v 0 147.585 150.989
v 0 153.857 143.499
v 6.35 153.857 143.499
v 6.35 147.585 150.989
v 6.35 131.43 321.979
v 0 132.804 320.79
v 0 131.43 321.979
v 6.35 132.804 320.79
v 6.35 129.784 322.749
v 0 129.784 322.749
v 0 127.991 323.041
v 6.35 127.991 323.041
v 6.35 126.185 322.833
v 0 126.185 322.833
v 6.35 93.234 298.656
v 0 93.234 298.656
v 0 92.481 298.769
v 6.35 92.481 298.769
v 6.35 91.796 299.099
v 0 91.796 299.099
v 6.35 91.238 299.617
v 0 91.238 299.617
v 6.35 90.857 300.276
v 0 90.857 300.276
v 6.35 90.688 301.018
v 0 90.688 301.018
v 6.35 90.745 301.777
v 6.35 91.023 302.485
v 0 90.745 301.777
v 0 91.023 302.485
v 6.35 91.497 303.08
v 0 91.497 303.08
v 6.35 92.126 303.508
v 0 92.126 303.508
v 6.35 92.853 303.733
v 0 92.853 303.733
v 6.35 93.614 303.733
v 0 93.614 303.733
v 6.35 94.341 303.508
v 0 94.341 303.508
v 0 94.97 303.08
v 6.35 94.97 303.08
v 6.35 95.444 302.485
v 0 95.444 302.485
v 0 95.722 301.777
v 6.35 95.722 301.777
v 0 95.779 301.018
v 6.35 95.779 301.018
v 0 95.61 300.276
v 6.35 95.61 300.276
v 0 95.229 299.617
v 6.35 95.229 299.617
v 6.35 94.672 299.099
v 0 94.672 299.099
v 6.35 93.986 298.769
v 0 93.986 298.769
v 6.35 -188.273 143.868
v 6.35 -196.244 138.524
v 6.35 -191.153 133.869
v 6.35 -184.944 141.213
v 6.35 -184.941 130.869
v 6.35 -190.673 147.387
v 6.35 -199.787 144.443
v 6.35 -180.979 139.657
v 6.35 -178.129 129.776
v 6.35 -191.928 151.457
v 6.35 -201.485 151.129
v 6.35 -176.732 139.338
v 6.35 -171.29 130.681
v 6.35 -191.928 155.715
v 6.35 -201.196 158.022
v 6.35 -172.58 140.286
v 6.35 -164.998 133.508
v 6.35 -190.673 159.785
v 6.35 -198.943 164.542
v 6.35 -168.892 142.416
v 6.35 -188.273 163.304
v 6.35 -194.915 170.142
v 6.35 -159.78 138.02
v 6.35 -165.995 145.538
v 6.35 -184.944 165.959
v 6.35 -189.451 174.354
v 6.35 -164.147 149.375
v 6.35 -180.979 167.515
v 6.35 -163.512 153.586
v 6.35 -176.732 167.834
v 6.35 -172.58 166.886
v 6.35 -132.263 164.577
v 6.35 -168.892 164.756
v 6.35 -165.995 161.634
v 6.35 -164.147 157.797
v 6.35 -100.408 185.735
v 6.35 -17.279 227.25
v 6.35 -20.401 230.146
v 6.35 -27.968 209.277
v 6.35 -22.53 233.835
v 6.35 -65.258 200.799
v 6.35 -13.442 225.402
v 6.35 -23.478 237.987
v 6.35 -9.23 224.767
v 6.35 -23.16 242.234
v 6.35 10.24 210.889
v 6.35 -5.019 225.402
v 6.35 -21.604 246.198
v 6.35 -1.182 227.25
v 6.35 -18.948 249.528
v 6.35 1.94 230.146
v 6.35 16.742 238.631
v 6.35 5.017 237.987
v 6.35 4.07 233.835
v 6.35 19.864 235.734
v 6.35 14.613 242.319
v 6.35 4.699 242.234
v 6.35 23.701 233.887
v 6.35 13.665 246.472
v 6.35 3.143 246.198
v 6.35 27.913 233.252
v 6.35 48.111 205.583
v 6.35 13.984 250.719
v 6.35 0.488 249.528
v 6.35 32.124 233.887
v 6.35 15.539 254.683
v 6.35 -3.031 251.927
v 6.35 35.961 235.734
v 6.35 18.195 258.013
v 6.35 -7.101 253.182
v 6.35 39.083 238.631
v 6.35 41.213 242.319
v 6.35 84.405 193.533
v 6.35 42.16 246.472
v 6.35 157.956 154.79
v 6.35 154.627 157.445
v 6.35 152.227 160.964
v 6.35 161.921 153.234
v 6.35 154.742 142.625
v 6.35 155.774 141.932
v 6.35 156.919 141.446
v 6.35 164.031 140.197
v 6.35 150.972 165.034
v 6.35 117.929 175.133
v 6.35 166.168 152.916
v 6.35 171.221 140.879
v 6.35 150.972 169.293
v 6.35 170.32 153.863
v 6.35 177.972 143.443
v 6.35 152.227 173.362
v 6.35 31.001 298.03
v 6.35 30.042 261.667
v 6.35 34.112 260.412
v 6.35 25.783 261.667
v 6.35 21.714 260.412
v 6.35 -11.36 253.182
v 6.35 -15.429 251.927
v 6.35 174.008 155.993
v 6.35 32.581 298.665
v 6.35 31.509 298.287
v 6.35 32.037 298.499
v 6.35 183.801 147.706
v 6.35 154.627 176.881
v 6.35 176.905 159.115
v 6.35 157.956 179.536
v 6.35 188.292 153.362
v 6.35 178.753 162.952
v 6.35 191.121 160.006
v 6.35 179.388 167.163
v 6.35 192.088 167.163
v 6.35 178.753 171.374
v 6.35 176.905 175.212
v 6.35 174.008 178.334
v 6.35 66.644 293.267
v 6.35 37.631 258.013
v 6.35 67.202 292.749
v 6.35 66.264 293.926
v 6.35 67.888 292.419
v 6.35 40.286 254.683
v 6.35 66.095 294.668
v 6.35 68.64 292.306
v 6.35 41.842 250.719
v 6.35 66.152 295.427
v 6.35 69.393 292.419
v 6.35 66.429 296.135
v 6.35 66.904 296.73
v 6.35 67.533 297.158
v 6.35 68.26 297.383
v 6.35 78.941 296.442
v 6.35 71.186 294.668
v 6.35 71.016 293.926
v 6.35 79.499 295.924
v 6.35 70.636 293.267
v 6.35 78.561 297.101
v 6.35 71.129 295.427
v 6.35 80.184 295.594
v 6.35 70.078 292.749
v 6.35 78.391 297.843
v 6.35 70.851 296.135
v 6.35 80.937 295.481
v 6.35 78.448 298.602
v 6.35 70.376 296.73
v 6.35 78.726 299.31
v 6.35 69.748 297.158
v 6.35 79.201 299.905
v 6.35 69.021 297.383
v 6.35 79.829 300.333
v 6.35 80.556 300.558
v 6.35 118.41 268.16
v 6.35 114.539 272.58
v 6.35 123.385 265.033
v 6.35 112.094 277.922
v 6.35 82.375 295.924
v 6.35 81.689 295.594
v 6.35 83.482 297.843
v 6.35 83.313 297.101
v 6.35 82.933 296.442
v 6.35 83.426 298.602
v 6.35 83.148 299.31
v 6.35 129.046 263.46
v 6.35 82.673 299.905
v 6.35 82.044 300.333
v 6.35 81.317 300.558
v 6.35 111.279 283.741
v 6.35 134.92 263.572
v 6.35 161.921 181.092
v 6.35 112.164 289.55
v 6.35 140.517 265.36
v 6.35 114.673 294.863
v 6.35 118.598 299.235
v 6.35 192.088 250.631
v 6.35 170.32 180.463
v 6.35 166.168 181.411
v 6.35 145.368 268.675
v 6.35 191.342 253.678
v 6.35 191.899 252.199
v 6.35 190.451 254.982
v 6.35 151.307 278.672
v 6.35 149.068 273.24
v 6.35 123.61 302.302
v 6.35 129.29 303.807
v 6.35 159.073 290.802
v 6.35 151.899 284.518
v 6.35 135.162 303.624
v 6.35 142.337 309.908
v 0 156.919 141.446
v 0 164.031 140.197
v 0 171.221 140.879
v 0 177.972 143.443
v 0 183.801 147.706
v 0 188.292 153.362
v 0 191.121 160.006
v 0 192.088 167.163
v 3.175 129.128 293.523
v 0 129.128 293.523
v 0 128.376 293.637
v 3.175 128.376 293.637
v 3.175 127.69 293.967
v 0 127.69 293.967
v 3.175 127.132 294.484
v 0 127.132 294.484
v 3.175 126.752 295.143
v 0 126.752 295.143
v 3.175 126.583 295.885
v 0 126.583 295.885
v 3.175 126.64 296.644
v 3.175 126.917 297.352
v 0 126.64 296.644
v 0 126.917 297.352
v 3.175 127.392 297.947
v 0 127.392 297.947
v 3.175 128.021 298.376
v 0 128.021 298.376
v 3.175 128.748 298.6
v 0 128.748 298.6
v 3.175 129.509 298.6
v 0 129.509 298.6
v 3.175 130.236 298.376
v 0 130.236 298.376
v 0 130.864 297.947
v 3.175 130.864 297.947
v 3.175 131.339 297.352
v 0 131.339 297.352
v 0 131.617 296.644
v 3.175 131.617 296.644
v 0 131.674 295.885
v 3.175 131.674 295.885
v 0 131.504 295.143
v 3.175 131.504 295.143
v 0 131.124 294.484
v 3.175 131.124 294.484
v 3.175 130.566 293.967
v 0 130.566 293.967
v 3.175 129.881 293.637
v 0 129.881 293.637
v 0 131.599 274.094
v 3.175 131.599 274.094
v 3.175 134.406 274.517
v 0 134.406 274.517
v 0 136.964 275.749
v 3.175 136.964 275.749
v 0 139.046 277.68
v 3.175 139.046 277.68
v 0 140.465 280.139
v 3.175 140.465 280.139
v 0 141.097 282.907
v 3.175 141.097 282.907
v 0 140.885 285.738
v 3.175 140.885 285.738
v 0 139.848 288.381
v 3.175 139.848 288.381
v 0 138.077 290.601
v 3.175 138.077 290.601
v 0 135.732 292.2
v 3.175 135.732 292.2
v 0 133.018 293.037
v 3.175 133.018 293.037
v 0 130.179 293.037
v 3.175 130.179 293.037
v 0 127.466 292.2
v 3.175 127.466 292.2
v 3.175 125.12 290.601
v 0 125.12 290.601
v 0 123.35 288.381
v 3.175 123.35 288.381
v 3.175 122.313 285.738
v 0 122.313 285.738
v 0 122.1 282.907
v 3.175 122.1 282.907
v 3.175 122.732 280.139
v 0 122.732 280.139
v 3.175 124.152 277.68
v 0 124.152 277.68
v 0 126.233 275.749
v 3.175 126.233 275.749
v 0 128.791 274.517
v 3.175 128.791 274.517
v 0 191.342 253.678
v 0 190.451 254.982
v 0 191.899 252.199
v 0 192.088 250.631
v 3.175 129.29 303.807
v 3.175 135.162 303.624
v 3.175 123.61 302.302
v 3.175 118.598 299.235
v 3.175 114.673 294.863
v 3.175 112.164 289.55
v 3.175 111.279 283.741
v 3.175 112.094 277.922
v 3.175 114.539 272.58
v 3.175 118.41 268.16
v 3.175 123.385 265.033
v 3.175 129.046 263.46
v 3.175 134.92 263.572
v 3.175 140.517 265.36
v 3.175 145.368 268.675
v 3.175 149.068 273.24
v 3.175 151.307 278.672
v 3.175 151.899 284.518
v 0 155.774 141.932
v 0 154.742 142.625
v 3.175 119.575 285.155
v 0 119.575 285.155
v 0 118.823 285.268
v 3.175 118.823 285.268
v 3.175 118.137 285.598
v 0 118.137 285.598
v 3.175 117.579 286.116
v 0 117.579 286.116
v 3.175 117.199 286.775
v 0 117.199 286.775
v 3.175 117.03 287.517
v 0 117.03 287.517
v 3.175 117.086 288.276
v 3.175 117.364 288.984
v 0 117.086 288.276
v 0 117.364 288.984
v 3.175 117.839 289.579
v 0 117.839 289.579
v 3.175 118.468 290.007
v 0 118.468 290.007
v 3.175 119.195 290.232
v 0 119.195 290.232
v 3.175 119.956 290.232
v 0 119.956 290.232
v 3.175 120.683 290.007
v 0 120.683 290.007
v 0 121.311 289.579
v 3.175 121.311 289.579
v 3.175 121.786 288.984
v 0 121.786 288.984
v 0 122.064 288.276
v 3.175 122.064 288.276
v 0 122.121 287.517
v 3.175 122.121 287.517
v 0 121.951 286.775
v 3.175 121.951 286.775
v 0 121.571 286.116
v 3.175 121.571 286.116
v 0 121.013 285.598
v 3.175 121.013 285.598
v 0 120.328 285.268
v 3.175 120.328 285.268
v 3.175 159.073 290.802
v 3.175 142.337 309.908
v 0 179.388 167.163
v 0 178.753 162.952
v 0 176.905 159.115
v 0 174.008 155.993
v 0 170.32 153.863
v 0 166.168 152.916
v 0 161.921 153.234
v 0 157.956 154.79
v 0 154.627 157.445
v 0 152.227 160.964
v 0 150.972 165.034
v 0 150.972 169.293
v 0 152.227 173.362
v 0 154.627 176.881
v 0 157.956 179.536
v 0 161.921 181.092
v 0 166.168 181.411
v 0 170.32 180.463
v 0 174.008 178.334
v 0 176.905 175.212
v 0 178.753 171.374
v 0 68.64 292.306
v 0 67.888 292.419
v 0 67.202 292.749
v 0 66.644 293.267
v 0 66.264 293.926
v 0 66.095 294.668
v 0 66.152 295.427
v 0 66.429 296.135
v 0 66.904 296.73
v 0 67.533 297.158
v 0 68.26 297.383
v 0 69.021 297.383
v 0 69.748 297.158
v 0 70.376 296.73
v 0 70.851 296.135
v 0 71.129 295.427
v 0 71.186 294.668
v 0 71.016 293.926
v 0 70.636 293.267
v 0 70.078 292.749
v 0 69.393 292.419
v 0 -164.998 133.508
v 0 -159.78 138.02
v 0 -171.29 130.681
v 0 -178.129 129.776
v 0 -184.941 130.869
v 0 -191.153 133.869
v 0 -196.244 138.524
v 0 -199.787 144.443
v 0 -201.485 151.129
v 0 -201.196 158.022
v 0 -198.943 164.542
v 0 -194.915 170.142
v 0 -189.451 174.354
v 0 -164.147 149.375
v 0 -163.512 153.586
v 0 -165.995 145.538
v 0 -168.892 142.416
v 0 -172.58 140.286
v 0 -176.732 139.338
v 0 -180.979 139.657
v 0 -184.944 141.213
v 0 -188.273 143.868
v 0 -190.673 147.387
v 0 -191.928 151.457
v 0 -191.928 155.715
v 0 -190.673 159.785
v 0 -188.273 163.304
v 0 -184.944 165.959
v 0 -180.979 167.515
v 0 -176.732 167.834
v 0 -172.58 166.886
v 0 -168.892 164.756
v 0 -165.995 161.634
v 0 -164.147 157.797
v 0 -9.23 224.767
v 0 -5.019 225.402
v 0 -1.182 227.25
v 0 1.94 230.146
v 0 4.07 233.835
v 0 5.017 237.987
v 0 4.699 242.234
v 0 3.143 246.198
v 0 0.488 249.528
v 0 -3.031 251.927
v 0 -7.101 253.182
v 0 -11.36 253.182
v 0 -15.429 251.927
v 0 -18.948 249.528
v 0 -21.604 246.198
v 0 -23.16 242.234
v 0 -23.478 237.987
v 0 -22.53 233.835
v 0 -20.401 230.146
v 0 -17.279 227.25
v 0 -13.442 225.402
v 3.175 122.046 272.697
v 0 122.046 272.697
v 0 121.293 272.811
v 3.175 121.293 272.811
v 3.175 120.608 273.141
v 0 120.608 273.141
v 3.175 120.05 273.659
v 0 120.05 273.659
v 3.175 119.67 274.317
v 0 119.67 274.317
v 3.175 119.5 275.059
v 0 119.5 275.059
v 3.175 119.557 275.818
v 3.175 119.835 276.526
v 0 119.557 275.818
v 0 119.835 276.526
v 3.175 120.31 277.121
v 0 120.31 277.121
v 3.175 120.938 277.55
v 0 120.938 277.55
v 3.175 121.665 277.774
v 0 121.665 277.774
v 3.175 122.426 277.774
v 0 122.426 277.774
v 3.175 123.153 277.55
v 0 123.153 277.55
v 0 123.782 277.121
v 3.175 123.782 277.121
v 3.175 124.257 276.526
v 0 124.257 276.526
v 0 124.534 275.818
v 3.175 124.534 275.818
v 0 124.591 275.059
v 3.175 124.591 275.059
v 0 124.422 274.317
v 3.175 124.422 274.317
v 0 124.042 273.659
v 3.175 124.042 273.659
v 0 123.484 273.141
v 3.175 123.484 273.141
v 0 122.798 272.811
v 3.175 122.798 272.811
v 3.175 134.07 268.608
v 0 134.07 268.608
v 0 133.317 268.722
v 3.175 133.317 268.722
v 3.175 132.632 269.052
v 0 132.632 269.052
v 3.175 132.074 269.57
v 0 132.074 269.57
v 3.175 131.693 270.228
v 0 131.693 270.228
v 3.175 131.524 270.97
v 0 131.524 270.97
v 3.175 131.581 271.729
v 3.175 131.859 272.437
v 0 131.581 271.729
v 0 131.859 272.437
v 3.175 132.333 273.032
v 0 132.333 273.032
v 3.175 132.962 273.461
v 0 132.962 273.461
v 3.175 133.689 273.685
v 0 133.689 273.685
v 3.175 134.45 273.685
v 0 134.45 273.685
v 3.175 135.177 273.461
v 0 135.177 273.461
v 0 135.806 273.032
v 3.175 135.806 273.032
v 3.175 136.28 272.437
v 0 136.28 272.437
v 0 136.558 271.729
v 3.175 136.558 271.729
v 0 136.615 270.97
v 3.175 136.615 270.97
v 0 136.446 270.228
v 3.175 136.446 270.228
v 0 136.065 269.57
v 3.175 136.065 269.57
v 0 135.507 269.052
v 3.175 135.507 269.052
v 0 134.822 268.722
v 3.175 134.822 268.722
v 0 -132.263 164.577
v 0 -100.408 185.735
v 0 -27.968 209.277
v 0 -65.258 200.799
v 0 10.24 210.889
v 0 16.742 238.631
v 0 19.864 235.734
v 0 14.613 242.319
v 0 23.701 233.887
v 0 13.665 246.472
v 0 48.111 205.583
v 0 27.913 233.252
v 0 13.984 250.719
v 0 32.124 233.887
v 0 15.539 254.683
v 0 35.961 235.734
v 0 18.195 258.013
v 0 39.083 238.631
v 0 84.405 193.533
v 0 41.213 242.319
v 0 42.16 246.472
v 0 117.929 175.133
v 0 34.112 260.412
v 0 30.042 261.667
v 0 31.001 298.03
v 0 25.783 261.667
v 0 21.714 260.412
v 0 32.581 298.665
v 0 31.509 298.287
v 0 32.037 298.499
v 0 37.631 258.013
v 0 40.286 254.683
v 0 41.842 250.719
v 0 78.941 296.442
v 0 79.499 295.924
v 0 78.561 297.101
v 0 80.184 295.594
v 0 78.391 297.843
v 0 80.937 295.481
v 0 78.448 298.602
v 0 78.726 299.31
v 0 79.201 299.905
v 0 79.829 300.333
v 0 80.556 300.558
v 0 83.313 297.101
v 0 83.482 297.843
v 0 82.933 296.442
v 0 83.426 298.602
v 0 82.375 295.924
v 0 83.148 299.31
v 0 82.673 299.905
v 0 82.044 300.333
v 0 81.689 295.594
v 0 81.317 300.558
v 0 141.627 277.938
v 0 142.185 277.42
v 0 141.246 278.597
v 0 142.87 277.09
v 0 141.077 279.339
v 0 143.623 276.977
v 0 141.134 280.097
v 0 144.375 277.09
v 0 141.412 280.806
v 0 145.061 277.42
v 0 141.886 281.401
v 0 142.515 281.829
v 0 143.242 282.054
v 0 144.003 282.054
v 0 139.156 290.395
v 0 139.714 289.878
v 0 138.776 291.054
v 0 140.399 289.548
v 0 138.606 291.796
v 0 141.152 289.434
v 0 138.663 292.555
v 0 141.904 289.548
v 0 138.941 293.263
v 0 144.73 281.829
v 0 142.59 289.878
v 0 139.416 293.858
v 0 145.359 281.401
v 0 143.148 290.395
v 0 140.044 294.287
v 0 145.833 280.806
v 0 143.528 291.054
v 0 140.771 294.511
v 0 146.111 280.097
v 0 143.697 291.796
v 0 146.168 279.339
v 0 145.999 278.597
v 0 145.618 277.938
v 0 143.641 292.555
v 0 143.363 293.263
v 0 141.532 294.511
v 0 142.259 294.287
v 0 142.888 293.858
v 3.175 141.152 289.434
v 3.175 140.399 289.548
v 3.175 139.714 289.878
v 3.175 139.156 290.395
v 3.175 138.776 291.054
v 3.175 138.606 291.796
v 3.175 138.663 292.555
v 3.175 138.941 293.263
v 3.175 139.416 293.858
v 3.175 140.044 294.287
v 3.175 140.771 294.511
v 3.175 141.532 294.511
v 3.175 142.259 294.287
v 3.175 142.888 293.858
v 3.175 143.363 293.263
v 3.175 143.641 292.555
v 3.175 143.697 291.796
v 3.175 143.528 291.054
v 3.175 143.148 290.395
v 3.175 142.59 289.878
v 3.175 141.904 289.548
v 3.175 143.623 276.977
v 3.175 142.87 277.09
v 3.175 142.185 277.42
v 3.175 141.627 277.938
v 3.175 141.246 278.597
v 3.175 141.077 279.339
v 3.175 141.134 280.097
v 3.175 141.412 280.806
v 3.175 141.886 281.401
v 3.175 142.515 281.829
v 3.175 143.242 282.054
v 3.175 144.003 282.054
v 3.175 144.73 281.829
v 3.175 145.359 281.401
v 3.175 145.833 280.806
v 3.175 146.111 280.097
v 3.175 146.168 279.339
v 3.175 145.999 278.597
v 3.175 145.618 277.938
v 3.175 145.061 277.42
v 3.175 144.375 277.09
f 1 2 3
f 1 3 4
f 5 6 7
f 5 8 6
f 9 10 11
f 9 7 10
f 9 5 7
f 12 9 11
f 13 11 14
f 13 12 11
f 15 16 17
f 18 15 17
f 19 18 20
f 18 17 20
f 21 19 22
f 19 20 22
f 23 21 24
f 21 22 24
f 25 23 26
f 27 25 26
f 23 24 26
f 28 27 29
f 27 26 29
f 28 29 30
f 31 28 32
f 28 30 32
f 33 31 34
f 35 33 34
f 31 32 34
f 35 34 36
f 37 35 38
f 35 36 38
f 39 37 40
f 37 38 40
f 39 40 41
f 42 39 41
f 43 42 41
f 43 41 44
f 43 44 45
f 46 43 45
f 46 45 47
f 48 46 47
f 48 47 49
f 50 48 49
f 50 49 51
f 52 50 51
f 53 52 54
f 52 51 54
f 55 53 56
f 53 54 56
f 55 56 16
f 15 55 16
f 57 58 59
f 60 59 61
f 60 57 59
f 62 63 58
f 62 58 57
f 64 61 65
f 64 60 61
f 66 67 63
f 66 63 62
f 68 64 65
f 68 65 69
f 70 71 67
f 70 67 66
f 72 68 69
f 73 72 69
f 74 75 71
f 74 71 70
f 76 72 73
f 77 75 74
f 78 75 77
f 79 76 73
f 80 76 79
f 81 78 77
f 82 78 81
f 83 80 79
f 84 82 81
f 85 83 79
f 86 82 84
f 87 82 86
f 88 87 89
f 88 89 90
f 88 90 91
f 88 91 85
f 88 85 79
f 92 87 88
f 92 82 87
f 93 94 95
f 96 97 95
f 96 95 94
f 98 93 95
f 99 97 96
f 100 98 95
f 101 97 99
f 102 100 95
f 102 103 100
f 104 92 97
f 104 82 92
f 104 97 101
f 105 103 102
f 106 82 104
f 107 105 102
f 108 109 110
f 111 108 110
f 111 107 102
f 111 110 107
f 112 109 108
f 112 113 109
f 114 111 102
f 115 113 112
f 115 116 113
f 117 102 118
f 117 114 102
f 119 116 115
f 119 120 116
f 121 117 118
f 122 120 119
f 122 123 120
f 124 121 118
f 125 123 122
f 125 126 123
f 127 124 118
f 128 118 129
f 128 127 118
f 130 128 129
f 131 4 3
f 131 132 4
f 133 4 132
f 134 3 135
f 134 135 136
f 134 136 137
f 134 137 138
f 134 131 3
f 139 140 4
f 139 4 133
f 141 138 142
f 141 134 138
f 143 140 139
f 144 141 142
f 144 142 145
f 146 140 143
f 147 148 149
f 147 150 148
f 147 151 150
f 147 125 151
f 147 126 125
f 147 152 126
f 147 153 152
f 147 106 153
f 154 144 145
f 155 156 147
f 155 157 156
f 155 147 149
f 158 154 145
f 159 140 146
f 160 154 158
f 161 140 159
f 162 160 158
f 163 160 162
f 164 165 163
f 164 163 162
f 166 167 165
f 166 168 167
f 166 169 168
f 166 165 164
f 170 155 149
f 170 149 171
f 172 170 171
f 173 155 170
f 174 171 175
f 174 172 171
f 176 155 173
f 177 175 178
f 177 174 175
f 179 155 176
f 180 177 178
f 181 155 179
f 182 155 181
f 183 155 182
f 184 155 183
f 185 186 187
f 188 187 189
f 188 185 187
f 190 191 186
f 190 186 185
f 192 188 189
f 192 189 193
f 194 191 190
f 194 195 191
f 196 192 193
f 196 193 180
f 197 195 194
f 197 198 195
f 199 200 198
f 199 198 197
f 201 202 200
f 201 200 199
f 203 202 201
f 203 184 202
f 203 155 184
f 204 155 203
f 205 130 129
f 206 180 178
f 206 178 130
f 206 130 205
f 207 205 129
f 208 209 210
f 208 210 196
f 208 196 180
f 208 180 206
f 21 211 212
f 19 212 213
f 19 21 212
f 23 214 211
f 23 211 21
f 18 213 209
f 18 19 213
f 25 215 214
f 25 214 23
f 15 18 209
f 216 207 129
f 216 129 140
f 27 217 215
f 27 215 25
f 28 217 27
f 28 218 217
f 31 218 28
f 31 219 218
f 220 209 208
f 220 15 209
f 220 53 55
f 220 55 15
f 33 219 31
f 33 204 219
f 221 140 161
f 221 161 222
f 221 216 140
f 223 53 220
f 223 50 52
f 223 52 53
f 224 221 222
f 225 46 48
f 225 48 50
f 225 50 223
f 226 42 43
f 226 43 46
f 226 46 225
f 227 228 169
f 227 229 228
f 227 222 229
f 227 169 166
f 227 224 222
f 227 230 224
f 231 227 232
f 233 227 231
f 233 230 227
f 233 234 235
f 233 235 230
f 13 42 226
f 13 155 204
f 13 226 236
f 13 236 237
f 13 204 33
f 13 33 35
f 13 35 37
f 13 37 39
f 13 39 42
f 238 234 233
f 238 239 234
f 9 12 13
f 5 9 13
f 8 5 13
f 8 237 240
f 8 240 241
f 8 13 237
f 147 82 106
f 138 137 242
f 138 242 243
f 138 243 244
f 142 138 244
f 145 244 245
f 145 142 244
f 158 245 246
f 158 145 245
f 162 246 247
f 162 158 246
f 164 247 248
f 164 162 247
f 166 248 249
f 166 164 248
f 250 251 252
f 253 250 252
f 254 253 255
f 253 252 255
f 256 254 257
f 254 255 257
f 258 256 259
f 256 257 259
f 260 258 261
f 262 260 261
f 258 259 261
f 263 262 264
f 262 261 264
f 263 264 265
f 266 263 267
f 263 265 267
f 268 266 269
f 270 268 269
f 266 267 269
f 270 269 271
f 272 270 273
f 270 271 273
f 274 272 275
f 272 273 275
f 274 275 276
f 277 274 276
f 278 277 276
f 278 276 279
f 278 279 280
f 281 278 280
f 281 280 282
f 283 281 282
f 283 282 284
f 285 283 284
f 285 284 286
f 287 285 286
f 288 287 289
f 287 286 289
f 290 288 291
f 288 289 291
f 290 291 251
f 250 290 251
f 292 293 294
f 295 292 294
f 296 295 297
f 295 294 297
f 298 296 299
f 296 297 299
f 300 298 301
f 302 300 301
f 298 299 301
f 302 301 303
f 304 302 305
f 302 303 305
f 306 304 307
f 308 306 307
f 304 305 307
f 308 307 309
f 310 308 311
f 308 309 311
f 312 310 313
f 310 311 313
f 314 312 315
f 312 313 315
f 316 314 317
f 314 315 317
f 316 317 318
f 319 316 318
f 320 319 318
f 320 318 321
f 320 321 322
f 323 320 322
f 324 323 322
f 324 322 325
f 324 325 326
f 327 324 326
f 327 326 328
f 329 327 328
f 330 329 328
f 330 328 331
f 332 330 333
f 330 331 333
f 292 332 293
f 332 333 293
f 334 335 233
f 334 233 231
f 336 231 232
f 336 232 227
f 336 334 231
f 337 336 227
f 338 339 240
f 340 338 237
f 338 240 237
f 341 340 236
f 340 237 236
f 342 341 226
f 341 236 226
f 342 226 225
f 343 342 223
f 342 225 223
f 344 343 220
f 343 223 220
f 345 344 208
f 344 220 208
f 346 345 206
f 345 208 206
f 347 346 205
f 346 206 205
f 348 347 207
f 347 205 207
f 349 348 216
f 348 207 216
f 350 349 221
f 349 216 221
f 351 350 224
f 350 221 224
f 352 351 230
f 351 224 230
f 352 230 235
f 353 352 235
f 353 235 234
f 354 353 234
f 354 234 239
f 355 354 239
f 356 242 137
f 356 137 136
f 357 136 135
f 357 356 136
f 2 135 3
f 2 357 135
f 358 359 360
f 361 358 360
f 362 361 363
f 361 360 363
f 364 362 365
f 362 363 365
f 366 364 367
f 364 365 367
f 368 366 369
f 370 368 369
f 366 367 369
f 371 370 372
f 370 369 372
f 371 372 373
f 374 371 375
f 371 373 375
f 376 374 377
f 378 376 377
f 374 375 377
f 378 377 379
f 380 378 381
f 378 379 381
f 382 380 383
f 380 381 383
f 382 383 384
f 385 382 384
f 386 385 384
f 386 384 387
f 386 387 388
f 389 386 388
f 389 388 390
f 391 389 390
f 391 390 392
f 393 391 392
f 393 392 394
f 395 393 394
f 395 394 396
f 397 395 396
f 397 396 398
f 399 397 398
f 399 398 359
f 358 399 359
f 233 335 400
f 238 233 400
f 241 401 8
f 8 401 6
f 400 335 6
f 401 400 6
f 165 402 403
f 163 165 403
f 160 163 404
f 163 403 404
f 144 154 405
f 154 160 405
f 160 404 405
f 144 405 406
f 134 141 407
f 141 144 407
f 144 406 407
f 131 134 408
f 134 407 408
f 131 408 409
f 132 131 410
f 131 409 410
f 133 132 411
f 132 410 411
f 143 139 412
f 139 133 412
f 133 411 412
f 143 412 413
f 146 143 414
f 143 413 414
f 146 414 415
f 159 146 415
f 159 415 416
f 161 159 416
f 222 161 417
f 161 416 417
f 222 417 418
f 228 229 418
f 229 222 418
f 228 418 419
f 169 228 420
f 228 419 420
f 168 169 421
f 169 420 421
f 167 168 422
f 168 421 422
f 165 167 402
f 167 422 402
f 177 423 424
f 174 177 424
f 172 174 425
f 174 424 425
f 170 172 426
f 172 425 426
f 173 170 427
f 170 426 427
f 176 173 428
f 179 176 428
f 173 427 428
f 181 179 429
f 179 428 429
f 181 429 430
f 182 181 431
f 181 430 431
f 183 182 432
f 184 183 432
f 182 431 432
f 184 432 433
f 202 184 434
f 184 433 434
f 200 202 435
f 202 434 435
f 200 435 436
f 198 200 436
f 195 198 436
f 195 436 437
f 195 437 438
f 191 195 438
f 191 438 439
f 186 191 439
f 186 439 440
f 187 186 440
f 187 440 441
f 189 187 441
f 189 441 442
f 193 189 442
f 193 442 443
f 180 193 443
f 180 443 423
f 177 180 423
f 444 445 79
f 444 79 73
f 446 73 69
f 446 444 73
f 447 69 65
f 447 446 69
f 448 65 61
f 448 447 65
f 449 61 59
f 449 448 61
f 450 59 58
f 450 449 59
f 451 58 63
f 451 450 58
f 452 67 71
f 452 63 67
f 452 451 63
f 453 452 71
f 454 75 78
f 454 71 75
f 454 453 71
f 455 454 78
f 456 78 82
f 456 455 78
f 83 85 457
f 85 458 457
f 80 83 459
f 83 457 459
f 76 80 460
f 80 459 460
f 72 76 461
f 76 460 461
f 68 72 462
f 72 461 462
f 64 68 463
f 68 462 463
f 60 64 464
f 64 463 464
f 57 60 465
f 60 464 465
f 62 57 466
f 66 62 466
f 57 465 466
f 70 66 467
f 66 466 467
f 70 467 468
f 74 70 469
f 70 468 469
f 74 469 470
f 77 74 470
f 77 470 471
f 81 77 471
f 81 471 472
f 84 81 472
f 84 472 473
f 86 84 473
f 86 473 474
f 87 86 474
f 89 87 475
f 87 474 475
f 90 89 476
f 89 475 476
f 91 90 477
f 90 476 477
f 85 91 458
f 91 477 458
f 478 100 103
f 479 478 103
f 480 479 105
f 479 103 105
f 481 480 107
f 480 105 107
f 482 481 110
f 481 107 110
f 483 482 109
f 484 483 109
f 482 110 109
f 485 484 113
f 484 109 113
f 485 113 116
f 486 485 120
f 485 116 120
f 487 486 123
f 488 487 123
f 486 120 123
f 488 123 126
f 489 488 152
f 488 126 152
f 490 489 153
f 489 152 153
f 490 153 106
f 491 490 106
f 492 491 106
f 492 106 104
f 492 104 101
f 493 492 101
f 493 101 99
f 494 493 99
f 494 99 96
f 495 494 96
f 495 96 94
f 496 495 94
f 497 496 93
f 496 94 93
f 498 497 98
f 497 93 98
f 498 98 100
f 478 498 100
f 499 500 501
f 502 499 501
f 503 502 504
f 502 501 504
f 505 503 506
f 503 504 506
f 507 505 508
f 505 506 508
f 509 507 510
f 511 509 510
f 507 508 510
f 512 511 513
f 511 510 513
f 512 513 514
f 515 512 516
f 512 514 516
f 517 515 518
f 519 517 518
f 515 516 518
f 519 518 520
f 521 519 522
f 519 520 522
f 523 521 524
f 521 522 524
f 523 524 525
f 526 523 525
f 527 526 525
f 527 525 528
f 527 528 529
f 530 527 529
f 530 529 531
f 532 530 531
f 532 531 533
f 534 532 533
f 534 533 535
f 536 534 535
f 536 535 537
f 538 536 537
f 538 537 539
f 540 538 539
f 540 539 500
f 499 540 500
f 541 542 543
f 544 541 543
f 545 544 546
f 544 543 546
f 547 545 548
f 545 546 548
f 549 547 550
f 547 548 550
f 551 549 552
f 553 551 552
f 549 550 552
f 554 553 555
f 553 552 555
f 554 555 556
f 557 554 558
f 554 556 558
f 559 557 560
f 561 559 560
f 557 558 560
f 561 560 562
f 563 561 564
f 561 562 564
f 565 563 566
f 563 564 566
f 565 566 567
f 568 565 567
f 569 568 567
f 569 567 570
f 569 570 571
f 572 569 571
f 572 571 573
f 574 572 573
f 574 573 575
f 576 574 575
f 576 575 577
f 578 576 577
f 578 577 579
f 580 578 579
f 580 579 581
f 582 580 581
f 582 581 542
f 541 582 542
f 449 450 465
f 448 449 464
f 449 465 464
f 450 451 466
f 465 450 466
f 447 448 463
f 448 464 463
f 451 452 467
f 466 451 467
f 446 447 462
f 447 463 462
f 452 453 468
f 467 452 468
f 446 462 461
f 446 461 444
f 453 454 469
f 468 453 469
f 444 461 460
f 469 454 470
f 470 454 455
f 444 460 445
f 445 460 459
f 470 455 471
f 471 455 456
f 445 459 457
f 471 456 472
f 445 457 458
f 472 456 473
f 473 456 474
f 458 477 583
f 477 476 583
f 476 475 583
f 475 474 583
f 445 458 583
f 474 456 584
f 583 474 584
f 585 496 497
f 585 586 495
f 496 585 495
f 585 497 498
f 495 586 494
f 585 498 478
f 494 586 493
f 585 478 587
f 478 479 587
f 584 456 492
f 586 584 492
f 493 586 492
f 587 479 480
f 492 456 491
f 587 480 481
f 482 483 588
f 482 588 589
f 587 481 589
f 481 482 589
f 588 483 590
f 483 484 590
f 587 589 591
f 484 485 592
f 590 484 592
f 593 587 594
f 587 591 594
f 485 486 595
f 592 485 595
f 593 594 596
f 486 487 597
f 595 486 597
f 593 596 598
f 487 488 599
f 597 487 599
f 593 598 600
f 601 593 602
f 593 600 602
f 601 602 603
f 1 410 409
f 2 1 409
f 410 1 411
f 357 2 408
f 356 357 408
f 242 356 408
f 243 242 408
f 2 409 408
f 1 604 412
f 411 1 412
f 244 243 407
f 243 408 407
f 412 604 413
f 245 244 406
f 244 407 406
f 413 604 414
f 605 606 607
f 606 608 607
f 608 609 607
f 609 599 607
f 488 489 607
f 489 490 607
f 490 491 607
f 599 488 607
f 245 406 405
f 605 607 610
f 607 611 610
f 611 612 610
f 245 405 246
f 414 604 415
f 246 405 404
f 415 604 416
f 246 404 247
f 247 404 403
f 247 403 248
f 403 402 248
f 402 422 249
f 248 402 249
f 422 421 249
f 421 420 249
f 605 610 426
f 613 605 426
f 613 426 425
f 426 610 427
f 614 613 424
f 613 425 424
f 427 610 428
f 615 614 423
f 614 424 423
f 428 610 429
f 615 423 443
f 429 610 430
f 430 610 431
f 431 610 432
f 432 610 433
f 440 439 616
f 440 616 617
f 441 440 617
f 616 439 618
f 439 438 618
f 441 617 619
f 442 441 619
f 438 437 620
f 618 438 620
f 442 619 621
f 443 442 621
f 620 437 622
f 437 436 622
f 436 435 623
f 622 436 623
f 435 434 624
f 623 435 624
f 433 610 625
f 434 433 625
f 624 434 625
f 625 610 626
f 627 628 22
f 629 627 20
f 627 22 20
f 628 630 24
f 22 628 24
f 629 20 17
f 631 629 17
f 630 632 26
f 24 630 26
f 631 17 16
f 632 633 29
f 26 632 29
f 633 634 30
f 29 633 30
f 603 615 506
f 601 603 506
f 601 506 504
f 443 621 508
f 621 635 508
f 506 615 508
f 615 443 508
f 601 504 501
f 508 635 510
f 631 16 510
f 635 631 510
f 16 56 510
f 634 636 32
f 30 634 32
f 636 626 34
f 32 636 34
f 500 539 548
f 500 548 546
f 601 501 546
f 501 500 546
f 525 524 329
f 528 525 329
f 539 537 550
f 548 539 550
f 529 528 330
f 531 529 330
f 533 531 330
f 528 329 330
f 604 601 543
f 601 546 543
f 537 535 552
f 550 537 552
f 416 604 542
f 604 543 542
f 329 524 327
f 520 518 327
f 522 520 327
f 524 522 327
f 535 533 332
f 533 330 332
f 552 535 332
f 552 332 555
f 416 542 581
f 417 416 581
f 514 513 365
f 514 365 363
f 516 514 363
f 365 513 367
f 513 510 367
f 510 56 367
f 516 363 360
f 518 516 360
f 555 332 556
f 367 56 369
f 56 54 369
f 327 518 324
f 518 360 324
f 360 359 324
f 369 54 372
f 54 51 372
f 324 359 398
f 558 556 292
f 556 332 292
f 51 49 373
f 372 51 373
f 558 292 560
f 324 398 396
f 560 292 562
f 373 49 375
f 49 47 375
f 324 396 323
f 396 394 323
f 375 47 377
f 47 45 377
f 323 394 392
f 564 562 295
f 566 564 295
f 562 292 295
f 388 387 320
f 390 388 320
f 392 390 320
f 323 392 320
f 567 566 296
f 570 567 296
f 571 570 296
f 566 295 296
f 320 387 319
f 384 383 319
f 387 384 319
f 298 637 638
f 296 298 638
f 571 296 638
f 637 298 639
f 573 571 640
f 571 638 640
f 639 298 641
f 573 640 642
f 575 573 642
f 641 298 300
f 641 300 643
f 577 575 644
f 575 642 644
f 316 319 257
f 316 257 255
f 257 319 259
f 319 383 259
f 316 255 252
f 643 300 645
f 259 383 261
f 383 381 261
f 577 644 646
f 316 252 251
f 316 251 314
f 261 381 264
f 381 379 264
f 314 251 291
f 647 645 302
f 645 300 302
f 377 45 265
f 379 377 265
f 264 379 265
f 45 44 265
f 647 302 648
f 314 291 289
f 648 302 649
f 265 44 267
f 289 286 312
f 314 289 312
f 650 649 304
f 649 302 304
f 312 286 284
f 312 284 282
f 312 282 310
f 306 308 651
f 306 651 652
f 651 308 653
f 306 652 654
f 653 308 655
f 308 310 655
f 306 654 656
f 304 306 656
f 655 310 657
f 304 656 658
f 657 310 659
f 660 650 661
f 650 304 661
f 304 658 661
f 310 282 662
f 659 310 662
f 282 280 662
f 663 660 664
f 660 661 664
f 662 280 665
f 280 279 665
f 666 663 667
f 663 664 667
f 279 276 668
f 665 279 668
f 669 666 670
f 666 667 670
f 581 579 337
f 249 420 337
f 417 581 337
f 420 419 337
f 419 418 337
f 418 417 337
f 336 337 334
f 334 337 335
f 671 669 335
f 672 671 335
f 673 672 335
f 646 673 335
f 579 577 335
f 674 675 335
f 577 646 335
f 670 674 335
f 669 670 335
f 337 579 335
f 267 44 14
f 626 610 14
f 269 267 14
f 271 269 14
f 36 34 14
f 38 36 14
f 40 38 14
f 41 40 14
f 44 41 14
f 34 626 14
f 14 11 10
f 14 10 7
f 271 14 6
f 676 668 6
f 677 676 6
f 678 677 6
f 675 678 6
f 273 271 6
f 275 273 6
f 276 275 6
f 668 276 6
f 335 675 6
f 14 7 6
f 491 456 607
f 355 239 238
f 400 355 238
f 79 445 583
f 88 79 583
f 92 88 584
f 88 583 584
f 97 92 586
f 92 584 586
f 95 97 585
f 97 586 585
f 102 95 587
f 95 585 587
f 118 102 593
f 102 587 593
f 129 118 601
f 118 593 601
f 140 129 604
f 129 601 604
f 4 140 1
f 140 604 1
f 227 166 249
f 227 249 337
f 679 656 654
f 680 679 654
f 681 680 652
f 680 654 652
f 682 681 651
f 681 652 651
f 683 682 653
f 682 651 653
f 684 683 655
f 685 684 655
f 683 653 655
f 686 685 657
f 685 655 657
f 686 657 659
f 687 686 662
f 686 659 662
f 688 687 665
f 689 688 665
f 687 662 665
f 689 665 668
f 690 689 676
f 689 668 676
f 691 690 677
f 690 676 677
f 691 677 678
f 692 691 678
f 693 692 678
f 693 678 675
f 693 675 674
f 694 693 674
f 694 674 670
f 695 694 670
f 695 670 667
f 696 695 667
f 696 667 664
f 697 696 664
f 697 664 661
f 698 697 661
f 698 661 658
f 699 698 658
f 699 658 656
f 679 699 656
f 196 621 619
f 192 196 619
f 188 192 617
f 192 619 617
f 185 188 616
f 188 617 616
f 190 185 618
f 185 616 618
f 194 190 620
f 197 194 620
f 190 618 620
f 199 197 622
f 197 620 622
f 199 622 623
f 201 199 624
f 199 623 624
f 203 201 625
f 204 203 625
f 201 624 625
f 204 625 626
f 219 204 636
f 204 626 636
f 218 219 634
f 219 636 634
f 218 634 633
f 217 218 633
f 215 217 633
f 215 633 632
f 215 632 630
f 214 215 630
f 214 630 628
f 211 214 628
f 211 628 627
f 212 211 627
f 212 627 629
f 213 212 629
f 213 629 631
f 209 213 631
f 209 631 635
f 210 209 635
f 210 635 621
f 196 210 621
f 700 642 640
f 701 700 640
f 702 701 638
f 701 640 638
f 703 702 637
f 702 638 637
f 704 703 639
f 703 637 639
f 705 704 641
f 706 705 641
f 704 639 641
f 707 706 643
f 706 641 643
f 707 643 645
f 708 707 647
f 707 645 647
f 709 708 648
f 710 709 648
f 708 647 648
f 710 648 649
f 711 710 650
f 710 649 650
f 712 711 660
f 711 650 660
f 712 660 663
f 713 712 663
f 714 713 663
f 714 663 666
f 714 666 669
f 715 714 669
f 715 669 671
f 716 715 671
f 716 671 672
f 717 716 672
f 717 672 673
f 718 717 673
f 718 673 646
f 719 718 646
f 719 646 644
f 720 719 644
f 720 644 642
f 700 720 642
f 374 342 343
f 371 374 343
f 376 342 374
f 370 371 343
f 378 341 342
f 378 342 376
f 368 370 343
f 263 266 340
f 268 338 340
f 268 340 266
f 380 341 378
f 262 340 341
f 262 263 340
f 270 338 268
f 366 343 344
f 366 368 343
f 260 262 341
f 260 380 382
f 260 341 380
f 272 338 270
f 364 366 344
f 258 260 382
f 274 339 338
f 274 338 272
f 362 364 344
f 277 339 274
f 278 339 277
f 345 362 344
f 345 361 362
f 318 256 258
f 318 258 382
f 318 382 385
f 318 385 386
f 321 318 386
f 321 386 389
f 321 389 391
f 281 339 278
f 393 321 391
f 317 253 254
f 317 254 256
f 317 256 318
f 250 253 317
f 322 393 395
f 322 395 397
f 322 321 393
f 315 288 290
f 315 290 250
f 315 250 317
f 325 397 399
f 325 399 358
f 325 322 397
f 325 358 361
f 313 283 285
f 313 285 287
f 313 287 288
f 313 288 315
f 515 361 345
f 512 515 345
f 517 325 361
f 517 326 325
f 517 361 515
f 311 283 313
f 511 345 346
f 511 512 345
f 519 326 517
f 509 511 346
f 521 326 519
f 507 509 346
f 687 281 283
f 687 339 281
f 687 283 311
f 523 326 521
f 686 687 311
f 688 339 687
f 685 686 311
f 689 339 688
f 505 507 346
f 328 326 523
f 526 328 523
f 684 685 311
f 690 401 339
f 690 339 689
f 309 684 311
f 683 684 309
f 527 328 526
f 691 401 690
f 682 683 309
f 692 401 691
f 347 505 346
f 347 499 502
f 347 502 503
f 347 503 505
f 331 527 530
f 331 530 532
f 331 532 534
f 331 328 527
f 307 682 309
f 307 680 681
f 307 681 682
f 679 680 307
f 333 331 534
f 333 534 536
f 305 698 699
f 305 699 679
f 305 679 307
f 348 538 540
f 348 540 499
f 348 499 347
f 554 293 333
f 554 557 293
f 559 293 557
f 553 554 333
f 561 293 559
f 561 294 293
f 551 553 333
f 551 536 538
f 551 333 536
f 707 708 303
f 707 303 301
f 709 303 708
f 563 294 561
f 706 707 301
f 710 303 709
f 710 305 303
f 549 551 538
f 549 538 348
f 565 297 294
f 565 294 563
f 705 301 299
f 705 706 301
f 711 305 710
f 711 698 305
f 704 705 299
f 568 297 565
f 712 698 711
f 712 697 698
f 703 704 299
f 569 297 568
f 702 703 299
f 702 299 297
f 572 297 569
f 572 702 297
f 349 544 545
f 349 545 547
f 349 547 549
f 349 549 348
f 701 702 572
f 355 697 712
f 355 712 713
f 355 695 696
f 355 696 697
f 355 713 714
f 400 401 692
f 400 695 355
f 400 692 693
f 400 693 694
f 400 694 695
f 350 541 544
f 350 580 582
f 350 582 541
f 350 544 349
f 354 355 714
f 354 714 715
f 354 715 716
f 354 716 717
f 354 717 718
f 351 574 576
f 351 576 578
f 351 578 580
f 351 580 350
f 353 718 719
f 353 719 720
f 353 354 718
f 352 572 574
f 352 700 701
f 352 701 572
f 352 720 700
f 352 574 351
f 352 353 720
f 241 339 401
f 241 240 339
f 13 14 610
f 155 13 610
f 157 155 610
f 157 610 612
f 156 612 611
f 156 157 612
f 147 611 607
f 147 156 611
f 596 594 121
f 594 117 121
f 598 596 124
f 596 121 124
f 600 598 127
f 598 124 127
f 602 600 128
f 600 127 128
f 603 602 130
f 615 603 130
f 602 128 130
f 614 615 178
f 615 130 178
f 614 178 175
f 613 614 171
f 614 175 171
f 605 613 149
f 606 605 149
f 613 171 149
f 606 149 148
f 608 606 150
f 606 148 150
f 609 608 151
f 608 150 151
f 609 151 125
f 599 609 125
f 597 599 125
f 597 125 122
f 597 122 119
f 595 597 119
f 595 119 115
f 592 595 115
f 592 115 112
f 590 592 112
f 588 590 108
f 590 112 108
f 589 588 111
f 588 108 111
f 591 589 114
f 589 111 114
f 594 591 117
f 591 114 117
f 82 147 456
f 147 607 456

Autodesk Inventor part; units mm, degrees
ref_plane "YZ Plane" through (0, 0, 0) normal (1, 0, 0) x (0, 1, 0)
ref_plane "XZ Plane" through (0, 0, 0) normal (0, 1, 0) x (-1, 0, 0)
ref_plane "XY Plane" through (0, 0, 0) normal (0, 0, 1) x (1, 0, 0)
sketch "Sketch1" plane through (0, 0, 0) normal (1, 0, 0) x (0, 1, 0)
  circle A0 centre (0, 0) radius 203.2 construction
  circle A1 centre (165.1, 167.1631) radius 38.1 construction
  circle A2 centre (165.1, 167.1631) radius 31.75 construction
  circle A3 centre (-177.8, 153.586) radius 38.1 construction
  circle A4 centre (-177.8, 153.586) radius 31.75 construction
  circle A5 centre (279.4, 30.6697) radius 38.1 construction
  circle A6 centre (279.4, 30.6697) radius 31.75 construction
  line L0 (371.6722, 159.6086) -> (293.9242, 243.3925) construction
  line L1 (293.9242, 243.3925) -> (72.8278, 38.2242) construction
  line L2 (72.8278, 38.2242) -> (150.5758, -45.5597) construction
  line L3 (150.5758, -45.5597) -> (371.6722, 159.6086) construction
  line L4 (371.6722, 159.6086) -> (72.8278, 38.2242) construction
  line L5 (293.9242, 243.3925) -> (150.5758, -45.5597) construction
  line L6 (165.1, 167.1631) -> (279.4, 30.6697) construction
  point P0 (222.25, 98.9164)
  dimension "d0" = 406.4
  dimension "d1" = 76.2
  dimension "d2" = 6.35
  dimension "d4" = 114.3
  dimension "d5" = 301.625
  dimension "d6" = 177.8
  dimension "d51" = 165.1
  dimension "d52" = 279.4
  dimension "d53" = 30.6697
sketch "Sketch4" plane through (0, 0, 0) normal (1, 0, 0) x (0, 1, 0)
  circle A0 centre (0, 0) radius 203.2 construction
  circle A1 centre (165.1, 167.1631) radius 38.1 construction
  circle A2 centre (165.1, 167.1631) radius 31.75 construction
  circle A3 centre (-177.8, 153.586) radius 38.1 construction
  circle A4 centre (-177.8, 153.586) radius 31.75 construction
  circle A5 centre (279.4, 30.6697) radius 38.1 construction
  circle A6 centre (279.4, 30.6697) radius 31.75 construction
  line L0 (371.6722, 159.6086) -> (293.9242, 243.3925) construction
  line L1 (293.9242, 243.3925) -> (72.8278, 38.2242) construction
  line L2 (72.8278, 38.2242) -> (150.5758, -45.5597) construction
  line L3 (150.5758, -45.5597) -> (371.6722, 159.6086) construction
  line L4 (371.6722, 159.6086) -> (72.8278, 38.2242) construction
  line L5 (293.9242, 243.3925) -> (150.5758, -45.5597) construction
  line L6 (165.1, 167.1631) -> (279.4, 30.6697) construction
  circle A7 centre (-177.8, 153.586) radius 14.2875
  circle A8 centre (165.1, 167.1631) radius 14.2875
  circle A9 centre (279.4, 30.6697) radius 14.2875
  circle A10 centre (165.1, 167.1631) radius 23.8125 construction
  circle A11 centre (279.4, 30.6697) radius 23.8125 construction
  circle A12 centre (-177.8, 153.586) radius 23.8125 construction
  line L7 (261.1433, 15.3815) -> (146.8433, 151.8749)
  line L8 (309.92, 115.3835) -> (248.7672, 188.4102)
  line L9 (309.92, 115.3835) -> (303.1398, 28.8105)
  line L10 (248.7672, 188.4102) -> (130.1238, 323.85)
  line L11 (130.1238, 323.85) -> (31.75, 298.45)
  line L12 (31.75, 298.45) -> (-189.4509, 174.3536)
  arc A13 (148.3669, 150.2209) -> (-159.7797, 138.0199) centre (0, 0) ccw
  arc A14 (148.3669, 150.2209) -> (146.8433, 151.8749) centre (165.1, 167.1631) ccw
  arc A15 (256.4562, 24.2964) -> (303.1398, 28.8105) centre (279.4, 30.6697) ccw
  line L13 (332.7982, 201.5005) -> (111.7018, -3.6678) construction
  arc A16 (-189.4509, 174.3536) -> (-159.7797, 138.0199) centre (-177.8, 153.586) ccw
  point P0 (222.25, 98.9164)
  point P1 (279.3436, 151.8969)
  point P2 (261.1433, 15.3815)
  point P3 (147.5854, 150.9888)
  dimension "d27" = 28.575
  dimension "d29" = 9.525
  dimension "d31" = 101.6
  dimension "d33" = 101.6
  dimension "d35" = 95.25
  dimension "d58" = 298.45
  dimension "d59" = 323.85
  dimension "d60" = 31.75
extrude "Extrusion2" add sketch "Sketch4" along normal blind 6.35 contours L7 A14 A13 | L7 A13 A16 L12 L11 L10 L8 L9 A15
sketch "Sketch5" plane through (6.35, 0, 0) normal (1, 0, 0) x (0, 0, -1)
  line L0 (-323.85, 130.1238) -> (-298.45, 31.75) projected
  line L1 (-301.2085, 93.2336) -> (-294.8585, 68.6402) construction
  point P0 (0, 0)
  point P1 (-298.0335, 80.9369)
  point P2 (-311.15, 80.9369)
  point P3 (-298.0335, 80.9369)
  point P4 (-311.15, 80.9369)
  dimension "d39" = 12.7
  dimension "d57" = 25.4
hole "Hole2" at (6.35, 93.2336, 301.2085) at (6.35, 80.9369, 298.0335) at (6.35, 68.6402, 294.8585) direction (-1, 0, 0) diameter 5.1054 end through all clearance for "Flat Head Machine Screw (82)" size "#10" standard "Ansi Unified Screw Threads"
sketch "Sketch6" plane through (6.35, 0, 0) normal (1, 0, 0) x (0, 0, -1)
  circle A0 centre (-298.0335, 80.9369) radius 2.5527 projected
  circle A1 centre (-301.2085, 93.2336) radius 2.5527 projected
  circle A2 centre (-294.8585, 68.6402) radius 2.5527 projected
  arc A3 (-15.3815, 261.1433) -> (-28.8105, 303.1398) centre (-30.6697, 279.4) ccw projected
  line L0 (-28.8105, 303.1398) -> (-115.3835, 309.92) projected
  line L1 (-115.3835, 309.92) -> (-188.4102, 248.7672) projected
  line L2 (-188.4102, 248.7672) -> (-323.85, 130.1238) projected
  line L3 (-323.85, 130.1238) -> (-298.45, 31.75) projected
  line L4 (-298.45, 31.75) -> (-174.3536, -189.4509) projected
  arc A4 (-174.3536, -189.4509) -> (-138.0199, -159.7797) centre (-153.586, -177.8) ccw projected
  arc A5 (-150.9888, 147.5854) -> (-138.0199, -159.7797) centre (0, 0) ccw projected
  line L5 (-150.9888, 147.5854) -> (-15.3815, 261.1433) projected
  circle A6 centre (-30.6697, 279.4) radius 14.2875 projected
  circle A7 centre (-167.1631, 165.1) radius 14.2875 projected
  circle A8 centre (-153.586, -177.8) radius 14.2875 projected
  circle A9 centre (-167.1631, 165.1) radius 26.9875 construction
  line L6 (-167.1631, 192.0875) -> (-253.1141, 192.0875)
  line L7 (-188.4102, 248.7672) -> (-323.85, 130.1238) construction
  circle A10 centre (-167.1631, 165.1) radius 14.2875 construction
  line L8 (-150.9888, 147.5854) -> (-15.3815, 261.1433) construction
  arc A11 (-142.138, 154.997) -> (-167.1631, 192.0875) centre (-167.1631, 165.1) ccw
  dimension "d65" = 12.7
extrude "Extrusion3" cut sketch "Sketch6" against normal blind 25.4 contours A0 | A1 | A2 | L5 A11 L6 L2 L1 L0 A3 | A8
fillet "Fillet1" radius 6.604 4 edges at (3.175, 192.0875, 253.1141) (3.175, 130.1238, 323.85) (3.175, 31.75, 298.45) (3.175, 154.997, 142.138)
sketch "Sketch8" plane through (6.35, 0, 0) normal (1, 0, 0) x (0, 0, -1)
  circle A0 centre (-283.6185, 131.5988) radius 7.6454 construction
  circle A1 centre (-283.6185, 131.5988) radius 19.05 construction
  circle A2 centre (-167.1631, 165.1) radius 28.6512 construction
  arc A3 (-320.7904, 132.804) -> (-322.8331, 126.1854) centre (-316.4388, 127.8364) ccw construction
  line L0 (-320.7904, 132.804) -> (-254.9821, 190.4511) construction
  arc A4 (-250.6306, 192.0875) -> (-254.9821, 190.4511) centre (-250.6306, 185.4835) ccw construction
  line L1 (-250.6306, 192.0875) -> (-167.1631, 192.0875) construction
  arc A5 (-141.4456, 156.9185) -> (-167.1631, 192.0875) centre (-167.1631, 165.1) ccw construction
  arc A6 (-143.4989, 153.8574) -> (-141.4456, 156.9185) centre (-147.7388, 158.9206) ccw construction
  line L2 (-143.4989, 153.8574) -> (-150.9888, 147.5854) construction
  arc A7 (-150.9888, 147.5854) -> (-138.0199, -159.7797) centre (0, 0) ccw construction
  arc A8 (-174.3536, -189.4509) -> (-138.0199, -159.7797) centre (-153.586, -177.8) ccw construction
  line L3 (-174.3536, -189.4509) -> (-298.0299, 31.0012) construction
  arc A9 (-298.6647, 32.5814) -> (-298.0299, 31.0012) centre (-292.2704, 34.2324) ccw construction
  line L4 (-298.6647, 32.5814) -> (-322.8331, 126.1854) construction
  circle A10 centre (-298.0335, 80.9369) radius 2.5527 construction
  circle A11 centre (-301.2085, 93.2336) radius 2.5527 construction
  circle A12 centre (-294.8585, 68.6402) radius 2.5527 construction
  circle A13 centre (-153.586, -177.8) radius 14.2875 construction
  circle A14 centre (-167.1631, 165.1) radius 14.2875 construction
  circle A15 centre (-283.6185, 131.5988) radius 9.525
  circle A16 centre (-167.1631, 165.1) radius 14.2875
  circle A17 centre (-247.5393, 27.9128) radius 14.2875
  circle A18 centre (-247.5393, 27.9128) radius 19.05 construction
  circle A19 centre (-239.0544, -9.2303) radius 19.05 construction
  circle A20 centre (-239.0544, -9.2303) radius 14.2875
  dimension "d76" = 15.2908
  dimension "d77" = 38.1
  dimension "d78" = 57.3024
  dimension "d79" = 121.1783
  dimension "d81" = 25.4
  dimension "d83" = 19.05
  dimension "d84" = 28.575
  dimension "d85" = 158.9989
  dimension "d87" = 38.1
  dimension "d88" = 188.9989
  dimension "d111" = 31.75
extrude "Extrusion4" cut sketch "Sketch8" against normal through all
sketch "Sketch9" plane through (6.35, 0, 0) normal (1, 0, 0) x (0, 0, -1)
  circle A0 centre (-247.5393, 27.9128) radius 14.2875 construction
  circle A1 centre (-283.6185, 131.5988) radius 9.525 construction
  circle A2 centre (-239.0544, -9.2303) radius 14.2875 construction
  circle A3 centre (-167.1631, 165.1) radius 14.2875 construction
  arc A4 (-320.7904, 132.804) -> (-322.8331, 126.1854) centre (-316.4388, 127.8364) ccw construction
  line L0 (-320.7904, 132.804) -> (-254.9821, 190.4511) construction
  arc A5 (-250.6306, 192.0875) -> (-254.9821, 190.4511) centre (-250.6306, 185.4835) ccw construction
  line L1 (-250.6306, 192.0875) -> (-167.1631, 192.0875) construction
  arc A6 (-141.4456, 156.9185) -> (-167.1631, 192.0875) centre (-167.1631, 165.1) ccw construction
  arc A7 (-143.4989, 153.8574) -> (-141.4456, 156.9185) centre (-147.7388, 158.9206) ccw construction
  line L2 (-143.4989, 153.8574) -> (-150.9888, 147.5854) construction
  arc A8 (-150.9888, 147.5854) -> (-138.0199, -159.7797) centre (0, 0) ccw construction
  arc A9 (-174.3536, -189.4509) -> (-138.0199, -159.7797) centre (-153.586, -177.8) ccw construction
  line L3 (-174.3536, -189.4509) -> (-298.0299, 31.0012) construction
  arc A10 (-298.6647, 32.5814) -> (-298.0299, 31.0012) centre (-292.2704, 34.2324) ccw construction
  line L4 (-298.6647, 32.5814) -> (-322.8331, 126.1854) construction
  circle A11 centre (-298.0335, 80.9369) radius 2.5527 construction
  circle A12 centre (-301.2085, 93.2336) radius 2.5527 construction
  circle A13 centre (-294.8585, 68.6402) radius 2.5527 construction
  circle A14 centre (-153.586, -177.8) radius 14.2875 construction
  circle A15 centre (-283.6185, 131.5988) radius 20.32
  line L5 (-284.5175, 151.8989) -> (-290.8021, 159.0733)
  line L6 (-303.6236, 135.1623) -> (-309.9082, 142.3366)
  line L7 (-254.9821, 190.4511) -> (-320.7904, 132.804) construction
  line L8 (-290.8021, 159.0733) -> (-309.9082, 142.3366) construction
  line L9 (-283.6185, 131.5988) -> (-300.3551, 150.7049) construction
  line L10 (-290.8021, 159.0733) -> (-309.9082, 142.3366)
  dimension "d93" = 40.64
  dimension "d96" = 25.4
extrude "Extrusion5" cut sketch "Sketch9" against normal blind 3.175
sketch "Sketch10" plane through (3.175, 0, 0) normal (1, 0, 0) x (0, 0, -1)
  circle A0 centre (-247.5393, 27.9128) radius 14.2875 construction
  circle A1 centre (-283.6185, 131.5988) radius 9.525 construction
  circle A2 centre (-239.0544, -9.2303) radius 14.2875 construction
  circle A3 centre (-167.1631, 165.1) radius 14.2875 construction
  arc A4 (-298.6647, 32.5814) -> (-298.0299, 31.0012) centre (-292.2704, 34.2324) ccw construction
  line L0 (-298.6647, 32.5814) -> (-322.8331, 126.1854) construction
  arc A5 (-320.7904, 132.804) -> (-322.8331, 126.1854) centre (-316.4388, 127.8364) ccw construction
  line L1 (-320.7904, 132.804) -> (-309.9082, 142.3366) construction
  line L2 (-309.9082, 142.3366) -> (-303.6236, 135.1623) construction
  arc A6 (-303.6236, 135.1623) -> (-284.5175, 151.8989) centre (-283.6185, 131.5988) ccw construction
  line L3 (-284.5175, 151.8989) -> (-290.8021, 159.0733) construction
  line L4 (-290.8021, 159.0733) -> (-254.9821, 190.4511) construction
  arc A7 (-250.6306, 192.0875) -> (-254.9821, 190.4511) centre (-250.6306, 185.4835) ccw construction
  line L5 (-250.6306, 192.0875) -> (-167.1631, 192.0875) construction
  arc A8 (-141.4456, 156.9185) -> (-167.1631, 192.0875) centre (-167.1631, 165.1) ccw construction
  arc A9 (-143.4989, 153.8574) -> (-141.4456, 156.9185) centre (-147.7388, 158.9206) ccw construction
  line L6 (-143.4989, 153.8574) -> (-150.9888, 147.5854) construction
  arc A10 (-150.9888, 147.5854) -> (-138.0199, -159.7797) centre (0, 0) ccw construction
  arc A11 (-174.3536, -189.4509) -> (-138.0199, -159.7797) centre (-153.586, -177.8) ccw construction
  line L7 (-174.3536, -189.4509) -> (-298.0299, 31.0012) construction
  line L8 (-309.9082, 142.3366) -> (-290.8021, 159.0733) construction
  circle A12 centre (-298.0335, 80.9369) radius 2.5527 construction
  circle A13 centre (-301.2085, 93.2336) radius 2.5527 construction
  circle A14 centre (-294.8585, 68.6402) radius 2.5527 construction
  circle A15 centre (-153.586, -177.8) radius 14.2875 construction
  circle A16 centre (-283.6185, 131.5988) radius 12.7 construction
  point P0 (-279.5294, 143.6226)
  point P1 (-291.9868, 141.1519)
  point P2 (-296.0758, 129.1282)
  point P3 (-287.7075, 119.5751)
  point P4 (-275.2501, 122.0458)
  point P5 (-271.1611, 134.0695)
  dimension "d97" = 25.4
  dimension "d100" = 360
  dimension "d110" = 19.05
hole "Hole4" at (3.175, 143.6226, 279.5294) at (3.175, 141.1519, 291.9868) at (3.175, 129.1282, 296.0758) at (3.175, 119.5751, 287.7075) at (3.175, 122.0458, 275.2501) at (3.175, 134.0695, 271.1611) direction (-1, 0, 0) diameter 5.1054 end through all clearance for "Flat Head Machine Screw (82)" size "#10" standard "Ansi Unified Screw Threads"
properties part number "GP4-001" material "Polycarbonate, Smoke"
